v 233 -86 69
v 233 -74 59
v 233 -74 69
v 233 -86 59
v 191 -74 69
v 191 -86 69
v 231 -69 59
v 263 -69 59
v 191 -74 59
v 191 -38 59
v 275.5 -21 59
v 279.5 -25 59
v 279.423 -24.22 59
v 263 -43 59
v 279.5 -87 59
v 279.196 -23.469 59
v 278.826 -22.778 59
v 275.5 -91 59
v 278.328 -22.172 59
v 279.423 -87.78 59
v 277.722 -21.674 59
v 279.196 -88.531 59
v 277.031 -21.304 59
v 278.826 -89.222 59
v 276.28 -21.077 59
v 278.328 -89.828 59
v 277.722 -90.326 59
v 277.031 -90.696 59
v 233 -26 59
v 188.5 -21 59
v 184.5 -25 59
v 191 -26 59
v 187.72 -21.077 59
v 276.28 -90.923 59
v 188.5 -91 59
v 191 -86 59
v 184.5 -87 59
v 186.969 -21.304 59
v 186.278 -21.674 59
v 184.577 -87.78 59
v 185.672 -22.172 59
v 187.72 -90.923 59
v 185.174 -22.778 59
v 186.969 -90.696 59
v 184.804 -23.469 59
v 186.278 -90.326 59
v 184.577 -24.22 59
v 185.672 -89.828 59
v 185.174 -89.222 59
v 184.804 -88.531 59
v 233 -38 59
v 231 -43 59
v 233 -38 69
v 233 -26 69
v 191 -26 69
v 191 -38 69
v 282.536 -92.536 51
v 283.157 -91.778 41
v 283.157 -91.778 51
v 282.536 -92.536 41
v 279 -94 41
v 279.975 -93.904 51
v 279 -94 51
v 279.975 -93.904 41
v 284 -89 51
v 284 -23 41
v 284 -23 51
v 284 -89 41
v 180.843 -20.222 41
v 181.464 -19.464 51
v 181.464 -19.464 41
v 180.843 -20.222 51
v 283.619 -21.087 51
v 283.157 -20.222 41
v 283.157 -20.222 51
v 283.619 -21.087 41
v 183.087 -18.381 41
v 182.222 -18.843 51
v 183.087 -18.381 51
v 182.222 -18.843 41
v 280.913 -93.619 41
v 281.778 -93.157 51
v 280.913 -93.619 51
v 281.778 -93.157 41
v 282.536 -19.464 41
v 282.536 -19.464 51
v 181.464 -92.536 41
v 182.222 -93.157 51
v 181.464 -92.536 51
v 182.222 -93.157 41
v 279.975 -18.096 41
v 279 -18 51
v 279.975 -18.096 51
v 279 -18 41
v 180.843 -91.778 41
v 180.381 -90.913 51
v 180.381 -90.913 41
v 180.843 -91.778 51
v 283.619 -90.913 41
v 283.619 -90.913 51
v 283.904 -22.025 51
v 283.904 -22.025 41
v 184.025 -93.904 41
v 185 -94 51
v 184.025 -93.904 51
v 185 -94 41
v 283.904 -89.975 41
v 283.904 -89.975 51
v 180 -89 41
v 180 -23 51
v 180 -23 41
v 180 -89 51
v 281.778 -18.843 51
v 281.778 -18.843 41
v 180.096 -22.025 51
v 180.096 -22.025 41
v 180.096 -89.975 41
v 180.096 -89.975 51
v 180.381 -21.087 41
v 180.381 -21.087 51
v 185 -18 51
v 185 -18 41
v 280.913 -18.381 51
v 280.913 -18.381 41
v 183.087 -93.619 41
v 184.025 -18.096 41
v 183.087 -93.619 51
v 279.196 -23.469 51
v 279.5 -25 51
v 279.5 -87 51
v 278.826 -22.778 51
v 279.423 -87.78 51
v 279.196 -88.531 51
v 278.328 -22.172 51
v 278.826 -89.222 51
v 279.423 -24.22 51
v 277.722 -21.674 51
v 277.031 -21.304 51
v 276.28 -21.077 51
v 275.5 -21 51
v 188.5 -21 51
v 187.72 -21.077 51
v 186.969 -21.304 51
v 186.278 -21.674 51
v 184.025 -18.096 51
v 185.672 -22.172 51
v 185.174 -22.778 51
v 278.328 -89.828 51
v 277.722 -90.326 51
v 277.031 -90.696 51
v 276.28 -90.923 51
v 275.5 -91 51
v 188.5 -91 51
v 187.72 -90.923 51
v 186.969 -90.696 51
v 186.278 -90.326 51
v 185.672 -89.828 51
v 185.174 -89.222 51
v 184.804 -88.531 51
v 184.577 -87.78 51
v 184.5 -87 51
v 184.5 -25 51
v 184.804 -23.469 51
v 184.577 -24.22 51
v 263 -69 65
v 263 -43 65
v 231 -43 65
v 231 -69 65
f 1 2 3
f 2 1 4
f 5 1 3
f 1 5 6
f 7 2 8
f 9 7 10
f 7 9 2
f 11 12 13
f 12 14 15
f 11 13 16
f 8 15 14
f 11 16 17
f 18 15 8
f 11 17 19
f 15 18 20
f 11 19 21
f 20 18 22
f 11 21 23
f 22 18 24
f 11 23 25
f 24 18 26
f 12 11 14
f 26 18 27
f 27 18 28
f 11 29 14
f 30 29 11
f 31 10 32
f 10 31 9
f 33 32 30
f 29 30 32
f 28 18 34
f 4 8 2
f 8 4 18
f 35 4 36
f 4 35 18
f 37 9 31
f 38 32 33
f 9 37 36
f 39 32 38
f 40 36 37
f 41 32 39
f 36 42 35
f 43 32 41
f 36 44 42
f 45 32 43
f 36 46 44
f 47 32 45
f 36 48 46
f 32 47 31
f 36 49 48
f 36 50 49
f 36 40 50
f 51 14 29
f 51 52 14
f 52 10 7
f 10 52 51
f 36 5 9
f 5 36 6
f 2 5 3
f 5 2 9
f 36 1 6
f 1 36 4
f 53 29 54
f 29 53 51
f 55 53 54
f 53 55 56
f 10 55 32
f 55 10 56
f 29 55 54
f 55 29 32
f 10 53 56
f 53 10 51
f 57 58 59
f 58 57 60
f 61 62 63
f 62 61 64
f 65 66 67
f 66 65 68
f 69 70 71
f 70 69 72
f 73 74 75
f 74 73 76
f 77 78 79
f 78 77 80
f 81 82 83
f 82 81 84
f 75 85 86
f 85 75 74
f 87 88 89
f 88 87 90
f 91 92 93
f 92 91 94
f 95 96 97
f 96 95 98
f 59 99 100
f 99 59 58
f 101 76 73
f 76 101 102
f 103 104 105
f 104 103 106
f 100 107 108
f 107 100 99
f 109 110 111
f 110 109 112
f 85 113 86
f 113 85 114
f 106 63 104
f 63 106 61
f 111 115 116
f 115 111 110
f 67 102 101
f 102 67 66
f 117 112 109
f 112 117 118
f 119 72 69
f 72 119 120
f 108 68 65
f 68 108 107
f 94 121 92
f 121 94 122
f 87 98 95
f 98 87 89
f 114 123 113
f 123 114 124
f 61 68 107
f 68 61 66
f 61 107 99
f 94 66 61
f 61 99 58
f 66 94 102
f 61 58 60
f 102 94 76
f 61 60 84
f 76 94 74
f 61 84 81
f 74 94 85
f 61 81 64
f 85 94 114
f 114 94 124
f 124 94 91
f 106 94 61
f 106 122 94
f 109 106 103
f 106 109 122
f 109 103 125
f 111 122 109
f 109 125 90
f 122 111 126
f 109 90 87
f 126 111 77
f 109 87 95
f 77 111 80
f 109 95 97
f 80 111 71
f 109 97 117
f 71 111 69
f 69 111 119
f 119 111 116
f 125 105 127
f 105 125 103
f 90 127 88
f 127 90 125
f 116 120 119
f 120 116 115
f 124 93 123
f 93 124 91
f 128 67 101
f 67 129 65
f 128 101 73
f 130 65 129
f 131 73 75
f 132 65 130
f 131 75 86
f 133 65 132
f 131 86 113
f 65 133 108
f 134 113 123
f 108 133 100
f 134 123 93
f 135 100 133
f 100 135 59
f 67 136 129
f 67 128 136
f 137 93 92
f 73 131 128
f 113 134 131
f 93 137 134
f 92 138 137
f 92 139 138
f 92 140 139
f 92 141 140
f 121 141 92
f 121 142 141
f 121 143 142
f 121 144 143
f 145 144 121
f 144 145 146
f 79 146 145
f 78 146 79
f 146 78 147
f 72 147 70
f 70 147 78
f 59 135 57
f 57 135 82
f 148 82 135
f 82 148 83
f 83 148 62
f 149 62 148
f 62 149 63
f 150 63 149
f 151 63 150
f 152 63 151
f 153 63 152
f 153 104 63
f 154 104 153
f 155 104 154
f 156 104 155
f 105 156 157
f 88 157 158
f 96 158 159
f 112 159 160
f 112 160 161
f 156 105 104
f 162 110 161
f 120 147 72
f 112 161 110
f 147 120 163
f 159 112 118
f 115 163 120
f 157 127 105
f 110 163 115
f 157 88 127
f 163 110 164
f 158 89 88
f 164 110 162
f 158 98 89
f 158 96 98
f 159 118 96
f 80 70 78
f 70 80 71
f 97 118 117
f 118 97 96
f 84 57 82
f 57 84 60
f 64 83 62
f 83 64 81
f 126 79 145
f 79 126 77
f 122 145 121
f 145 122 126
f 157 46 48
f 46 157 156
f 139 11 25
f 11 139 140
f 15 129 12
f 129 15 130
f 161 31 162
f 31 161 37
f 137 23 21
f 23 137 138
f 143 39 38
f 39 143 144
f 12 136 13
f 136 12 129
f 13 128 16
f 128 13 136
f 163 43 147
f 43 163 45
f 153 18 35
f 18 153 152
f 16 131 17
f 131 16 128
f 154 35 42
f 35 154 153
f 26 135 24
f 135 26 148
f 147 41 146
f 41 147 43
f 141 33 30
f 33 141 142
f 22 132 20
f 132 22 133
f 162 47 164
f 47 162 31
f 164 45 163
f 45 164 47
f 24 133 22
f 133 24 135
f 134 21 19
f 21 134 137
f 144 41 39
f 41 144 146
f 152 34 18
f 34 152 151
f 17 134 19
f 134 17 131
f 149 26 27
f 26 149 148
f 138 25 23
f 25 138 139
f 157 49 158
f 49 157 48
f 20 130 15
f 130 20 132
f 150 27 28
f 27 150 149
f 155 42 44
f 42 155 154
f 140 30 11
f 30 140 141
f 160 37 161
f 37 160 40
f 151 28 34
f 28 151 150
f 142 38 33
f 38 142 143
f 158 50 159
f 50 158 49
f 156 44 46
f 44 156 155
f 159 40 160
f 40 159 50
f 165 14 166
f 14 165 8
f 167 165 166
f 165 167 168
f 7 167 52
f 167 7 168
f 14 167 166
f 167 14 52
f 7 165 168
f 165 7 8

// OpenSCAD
export_only = true;
include <main.scad>
esp32_s3_controller();
